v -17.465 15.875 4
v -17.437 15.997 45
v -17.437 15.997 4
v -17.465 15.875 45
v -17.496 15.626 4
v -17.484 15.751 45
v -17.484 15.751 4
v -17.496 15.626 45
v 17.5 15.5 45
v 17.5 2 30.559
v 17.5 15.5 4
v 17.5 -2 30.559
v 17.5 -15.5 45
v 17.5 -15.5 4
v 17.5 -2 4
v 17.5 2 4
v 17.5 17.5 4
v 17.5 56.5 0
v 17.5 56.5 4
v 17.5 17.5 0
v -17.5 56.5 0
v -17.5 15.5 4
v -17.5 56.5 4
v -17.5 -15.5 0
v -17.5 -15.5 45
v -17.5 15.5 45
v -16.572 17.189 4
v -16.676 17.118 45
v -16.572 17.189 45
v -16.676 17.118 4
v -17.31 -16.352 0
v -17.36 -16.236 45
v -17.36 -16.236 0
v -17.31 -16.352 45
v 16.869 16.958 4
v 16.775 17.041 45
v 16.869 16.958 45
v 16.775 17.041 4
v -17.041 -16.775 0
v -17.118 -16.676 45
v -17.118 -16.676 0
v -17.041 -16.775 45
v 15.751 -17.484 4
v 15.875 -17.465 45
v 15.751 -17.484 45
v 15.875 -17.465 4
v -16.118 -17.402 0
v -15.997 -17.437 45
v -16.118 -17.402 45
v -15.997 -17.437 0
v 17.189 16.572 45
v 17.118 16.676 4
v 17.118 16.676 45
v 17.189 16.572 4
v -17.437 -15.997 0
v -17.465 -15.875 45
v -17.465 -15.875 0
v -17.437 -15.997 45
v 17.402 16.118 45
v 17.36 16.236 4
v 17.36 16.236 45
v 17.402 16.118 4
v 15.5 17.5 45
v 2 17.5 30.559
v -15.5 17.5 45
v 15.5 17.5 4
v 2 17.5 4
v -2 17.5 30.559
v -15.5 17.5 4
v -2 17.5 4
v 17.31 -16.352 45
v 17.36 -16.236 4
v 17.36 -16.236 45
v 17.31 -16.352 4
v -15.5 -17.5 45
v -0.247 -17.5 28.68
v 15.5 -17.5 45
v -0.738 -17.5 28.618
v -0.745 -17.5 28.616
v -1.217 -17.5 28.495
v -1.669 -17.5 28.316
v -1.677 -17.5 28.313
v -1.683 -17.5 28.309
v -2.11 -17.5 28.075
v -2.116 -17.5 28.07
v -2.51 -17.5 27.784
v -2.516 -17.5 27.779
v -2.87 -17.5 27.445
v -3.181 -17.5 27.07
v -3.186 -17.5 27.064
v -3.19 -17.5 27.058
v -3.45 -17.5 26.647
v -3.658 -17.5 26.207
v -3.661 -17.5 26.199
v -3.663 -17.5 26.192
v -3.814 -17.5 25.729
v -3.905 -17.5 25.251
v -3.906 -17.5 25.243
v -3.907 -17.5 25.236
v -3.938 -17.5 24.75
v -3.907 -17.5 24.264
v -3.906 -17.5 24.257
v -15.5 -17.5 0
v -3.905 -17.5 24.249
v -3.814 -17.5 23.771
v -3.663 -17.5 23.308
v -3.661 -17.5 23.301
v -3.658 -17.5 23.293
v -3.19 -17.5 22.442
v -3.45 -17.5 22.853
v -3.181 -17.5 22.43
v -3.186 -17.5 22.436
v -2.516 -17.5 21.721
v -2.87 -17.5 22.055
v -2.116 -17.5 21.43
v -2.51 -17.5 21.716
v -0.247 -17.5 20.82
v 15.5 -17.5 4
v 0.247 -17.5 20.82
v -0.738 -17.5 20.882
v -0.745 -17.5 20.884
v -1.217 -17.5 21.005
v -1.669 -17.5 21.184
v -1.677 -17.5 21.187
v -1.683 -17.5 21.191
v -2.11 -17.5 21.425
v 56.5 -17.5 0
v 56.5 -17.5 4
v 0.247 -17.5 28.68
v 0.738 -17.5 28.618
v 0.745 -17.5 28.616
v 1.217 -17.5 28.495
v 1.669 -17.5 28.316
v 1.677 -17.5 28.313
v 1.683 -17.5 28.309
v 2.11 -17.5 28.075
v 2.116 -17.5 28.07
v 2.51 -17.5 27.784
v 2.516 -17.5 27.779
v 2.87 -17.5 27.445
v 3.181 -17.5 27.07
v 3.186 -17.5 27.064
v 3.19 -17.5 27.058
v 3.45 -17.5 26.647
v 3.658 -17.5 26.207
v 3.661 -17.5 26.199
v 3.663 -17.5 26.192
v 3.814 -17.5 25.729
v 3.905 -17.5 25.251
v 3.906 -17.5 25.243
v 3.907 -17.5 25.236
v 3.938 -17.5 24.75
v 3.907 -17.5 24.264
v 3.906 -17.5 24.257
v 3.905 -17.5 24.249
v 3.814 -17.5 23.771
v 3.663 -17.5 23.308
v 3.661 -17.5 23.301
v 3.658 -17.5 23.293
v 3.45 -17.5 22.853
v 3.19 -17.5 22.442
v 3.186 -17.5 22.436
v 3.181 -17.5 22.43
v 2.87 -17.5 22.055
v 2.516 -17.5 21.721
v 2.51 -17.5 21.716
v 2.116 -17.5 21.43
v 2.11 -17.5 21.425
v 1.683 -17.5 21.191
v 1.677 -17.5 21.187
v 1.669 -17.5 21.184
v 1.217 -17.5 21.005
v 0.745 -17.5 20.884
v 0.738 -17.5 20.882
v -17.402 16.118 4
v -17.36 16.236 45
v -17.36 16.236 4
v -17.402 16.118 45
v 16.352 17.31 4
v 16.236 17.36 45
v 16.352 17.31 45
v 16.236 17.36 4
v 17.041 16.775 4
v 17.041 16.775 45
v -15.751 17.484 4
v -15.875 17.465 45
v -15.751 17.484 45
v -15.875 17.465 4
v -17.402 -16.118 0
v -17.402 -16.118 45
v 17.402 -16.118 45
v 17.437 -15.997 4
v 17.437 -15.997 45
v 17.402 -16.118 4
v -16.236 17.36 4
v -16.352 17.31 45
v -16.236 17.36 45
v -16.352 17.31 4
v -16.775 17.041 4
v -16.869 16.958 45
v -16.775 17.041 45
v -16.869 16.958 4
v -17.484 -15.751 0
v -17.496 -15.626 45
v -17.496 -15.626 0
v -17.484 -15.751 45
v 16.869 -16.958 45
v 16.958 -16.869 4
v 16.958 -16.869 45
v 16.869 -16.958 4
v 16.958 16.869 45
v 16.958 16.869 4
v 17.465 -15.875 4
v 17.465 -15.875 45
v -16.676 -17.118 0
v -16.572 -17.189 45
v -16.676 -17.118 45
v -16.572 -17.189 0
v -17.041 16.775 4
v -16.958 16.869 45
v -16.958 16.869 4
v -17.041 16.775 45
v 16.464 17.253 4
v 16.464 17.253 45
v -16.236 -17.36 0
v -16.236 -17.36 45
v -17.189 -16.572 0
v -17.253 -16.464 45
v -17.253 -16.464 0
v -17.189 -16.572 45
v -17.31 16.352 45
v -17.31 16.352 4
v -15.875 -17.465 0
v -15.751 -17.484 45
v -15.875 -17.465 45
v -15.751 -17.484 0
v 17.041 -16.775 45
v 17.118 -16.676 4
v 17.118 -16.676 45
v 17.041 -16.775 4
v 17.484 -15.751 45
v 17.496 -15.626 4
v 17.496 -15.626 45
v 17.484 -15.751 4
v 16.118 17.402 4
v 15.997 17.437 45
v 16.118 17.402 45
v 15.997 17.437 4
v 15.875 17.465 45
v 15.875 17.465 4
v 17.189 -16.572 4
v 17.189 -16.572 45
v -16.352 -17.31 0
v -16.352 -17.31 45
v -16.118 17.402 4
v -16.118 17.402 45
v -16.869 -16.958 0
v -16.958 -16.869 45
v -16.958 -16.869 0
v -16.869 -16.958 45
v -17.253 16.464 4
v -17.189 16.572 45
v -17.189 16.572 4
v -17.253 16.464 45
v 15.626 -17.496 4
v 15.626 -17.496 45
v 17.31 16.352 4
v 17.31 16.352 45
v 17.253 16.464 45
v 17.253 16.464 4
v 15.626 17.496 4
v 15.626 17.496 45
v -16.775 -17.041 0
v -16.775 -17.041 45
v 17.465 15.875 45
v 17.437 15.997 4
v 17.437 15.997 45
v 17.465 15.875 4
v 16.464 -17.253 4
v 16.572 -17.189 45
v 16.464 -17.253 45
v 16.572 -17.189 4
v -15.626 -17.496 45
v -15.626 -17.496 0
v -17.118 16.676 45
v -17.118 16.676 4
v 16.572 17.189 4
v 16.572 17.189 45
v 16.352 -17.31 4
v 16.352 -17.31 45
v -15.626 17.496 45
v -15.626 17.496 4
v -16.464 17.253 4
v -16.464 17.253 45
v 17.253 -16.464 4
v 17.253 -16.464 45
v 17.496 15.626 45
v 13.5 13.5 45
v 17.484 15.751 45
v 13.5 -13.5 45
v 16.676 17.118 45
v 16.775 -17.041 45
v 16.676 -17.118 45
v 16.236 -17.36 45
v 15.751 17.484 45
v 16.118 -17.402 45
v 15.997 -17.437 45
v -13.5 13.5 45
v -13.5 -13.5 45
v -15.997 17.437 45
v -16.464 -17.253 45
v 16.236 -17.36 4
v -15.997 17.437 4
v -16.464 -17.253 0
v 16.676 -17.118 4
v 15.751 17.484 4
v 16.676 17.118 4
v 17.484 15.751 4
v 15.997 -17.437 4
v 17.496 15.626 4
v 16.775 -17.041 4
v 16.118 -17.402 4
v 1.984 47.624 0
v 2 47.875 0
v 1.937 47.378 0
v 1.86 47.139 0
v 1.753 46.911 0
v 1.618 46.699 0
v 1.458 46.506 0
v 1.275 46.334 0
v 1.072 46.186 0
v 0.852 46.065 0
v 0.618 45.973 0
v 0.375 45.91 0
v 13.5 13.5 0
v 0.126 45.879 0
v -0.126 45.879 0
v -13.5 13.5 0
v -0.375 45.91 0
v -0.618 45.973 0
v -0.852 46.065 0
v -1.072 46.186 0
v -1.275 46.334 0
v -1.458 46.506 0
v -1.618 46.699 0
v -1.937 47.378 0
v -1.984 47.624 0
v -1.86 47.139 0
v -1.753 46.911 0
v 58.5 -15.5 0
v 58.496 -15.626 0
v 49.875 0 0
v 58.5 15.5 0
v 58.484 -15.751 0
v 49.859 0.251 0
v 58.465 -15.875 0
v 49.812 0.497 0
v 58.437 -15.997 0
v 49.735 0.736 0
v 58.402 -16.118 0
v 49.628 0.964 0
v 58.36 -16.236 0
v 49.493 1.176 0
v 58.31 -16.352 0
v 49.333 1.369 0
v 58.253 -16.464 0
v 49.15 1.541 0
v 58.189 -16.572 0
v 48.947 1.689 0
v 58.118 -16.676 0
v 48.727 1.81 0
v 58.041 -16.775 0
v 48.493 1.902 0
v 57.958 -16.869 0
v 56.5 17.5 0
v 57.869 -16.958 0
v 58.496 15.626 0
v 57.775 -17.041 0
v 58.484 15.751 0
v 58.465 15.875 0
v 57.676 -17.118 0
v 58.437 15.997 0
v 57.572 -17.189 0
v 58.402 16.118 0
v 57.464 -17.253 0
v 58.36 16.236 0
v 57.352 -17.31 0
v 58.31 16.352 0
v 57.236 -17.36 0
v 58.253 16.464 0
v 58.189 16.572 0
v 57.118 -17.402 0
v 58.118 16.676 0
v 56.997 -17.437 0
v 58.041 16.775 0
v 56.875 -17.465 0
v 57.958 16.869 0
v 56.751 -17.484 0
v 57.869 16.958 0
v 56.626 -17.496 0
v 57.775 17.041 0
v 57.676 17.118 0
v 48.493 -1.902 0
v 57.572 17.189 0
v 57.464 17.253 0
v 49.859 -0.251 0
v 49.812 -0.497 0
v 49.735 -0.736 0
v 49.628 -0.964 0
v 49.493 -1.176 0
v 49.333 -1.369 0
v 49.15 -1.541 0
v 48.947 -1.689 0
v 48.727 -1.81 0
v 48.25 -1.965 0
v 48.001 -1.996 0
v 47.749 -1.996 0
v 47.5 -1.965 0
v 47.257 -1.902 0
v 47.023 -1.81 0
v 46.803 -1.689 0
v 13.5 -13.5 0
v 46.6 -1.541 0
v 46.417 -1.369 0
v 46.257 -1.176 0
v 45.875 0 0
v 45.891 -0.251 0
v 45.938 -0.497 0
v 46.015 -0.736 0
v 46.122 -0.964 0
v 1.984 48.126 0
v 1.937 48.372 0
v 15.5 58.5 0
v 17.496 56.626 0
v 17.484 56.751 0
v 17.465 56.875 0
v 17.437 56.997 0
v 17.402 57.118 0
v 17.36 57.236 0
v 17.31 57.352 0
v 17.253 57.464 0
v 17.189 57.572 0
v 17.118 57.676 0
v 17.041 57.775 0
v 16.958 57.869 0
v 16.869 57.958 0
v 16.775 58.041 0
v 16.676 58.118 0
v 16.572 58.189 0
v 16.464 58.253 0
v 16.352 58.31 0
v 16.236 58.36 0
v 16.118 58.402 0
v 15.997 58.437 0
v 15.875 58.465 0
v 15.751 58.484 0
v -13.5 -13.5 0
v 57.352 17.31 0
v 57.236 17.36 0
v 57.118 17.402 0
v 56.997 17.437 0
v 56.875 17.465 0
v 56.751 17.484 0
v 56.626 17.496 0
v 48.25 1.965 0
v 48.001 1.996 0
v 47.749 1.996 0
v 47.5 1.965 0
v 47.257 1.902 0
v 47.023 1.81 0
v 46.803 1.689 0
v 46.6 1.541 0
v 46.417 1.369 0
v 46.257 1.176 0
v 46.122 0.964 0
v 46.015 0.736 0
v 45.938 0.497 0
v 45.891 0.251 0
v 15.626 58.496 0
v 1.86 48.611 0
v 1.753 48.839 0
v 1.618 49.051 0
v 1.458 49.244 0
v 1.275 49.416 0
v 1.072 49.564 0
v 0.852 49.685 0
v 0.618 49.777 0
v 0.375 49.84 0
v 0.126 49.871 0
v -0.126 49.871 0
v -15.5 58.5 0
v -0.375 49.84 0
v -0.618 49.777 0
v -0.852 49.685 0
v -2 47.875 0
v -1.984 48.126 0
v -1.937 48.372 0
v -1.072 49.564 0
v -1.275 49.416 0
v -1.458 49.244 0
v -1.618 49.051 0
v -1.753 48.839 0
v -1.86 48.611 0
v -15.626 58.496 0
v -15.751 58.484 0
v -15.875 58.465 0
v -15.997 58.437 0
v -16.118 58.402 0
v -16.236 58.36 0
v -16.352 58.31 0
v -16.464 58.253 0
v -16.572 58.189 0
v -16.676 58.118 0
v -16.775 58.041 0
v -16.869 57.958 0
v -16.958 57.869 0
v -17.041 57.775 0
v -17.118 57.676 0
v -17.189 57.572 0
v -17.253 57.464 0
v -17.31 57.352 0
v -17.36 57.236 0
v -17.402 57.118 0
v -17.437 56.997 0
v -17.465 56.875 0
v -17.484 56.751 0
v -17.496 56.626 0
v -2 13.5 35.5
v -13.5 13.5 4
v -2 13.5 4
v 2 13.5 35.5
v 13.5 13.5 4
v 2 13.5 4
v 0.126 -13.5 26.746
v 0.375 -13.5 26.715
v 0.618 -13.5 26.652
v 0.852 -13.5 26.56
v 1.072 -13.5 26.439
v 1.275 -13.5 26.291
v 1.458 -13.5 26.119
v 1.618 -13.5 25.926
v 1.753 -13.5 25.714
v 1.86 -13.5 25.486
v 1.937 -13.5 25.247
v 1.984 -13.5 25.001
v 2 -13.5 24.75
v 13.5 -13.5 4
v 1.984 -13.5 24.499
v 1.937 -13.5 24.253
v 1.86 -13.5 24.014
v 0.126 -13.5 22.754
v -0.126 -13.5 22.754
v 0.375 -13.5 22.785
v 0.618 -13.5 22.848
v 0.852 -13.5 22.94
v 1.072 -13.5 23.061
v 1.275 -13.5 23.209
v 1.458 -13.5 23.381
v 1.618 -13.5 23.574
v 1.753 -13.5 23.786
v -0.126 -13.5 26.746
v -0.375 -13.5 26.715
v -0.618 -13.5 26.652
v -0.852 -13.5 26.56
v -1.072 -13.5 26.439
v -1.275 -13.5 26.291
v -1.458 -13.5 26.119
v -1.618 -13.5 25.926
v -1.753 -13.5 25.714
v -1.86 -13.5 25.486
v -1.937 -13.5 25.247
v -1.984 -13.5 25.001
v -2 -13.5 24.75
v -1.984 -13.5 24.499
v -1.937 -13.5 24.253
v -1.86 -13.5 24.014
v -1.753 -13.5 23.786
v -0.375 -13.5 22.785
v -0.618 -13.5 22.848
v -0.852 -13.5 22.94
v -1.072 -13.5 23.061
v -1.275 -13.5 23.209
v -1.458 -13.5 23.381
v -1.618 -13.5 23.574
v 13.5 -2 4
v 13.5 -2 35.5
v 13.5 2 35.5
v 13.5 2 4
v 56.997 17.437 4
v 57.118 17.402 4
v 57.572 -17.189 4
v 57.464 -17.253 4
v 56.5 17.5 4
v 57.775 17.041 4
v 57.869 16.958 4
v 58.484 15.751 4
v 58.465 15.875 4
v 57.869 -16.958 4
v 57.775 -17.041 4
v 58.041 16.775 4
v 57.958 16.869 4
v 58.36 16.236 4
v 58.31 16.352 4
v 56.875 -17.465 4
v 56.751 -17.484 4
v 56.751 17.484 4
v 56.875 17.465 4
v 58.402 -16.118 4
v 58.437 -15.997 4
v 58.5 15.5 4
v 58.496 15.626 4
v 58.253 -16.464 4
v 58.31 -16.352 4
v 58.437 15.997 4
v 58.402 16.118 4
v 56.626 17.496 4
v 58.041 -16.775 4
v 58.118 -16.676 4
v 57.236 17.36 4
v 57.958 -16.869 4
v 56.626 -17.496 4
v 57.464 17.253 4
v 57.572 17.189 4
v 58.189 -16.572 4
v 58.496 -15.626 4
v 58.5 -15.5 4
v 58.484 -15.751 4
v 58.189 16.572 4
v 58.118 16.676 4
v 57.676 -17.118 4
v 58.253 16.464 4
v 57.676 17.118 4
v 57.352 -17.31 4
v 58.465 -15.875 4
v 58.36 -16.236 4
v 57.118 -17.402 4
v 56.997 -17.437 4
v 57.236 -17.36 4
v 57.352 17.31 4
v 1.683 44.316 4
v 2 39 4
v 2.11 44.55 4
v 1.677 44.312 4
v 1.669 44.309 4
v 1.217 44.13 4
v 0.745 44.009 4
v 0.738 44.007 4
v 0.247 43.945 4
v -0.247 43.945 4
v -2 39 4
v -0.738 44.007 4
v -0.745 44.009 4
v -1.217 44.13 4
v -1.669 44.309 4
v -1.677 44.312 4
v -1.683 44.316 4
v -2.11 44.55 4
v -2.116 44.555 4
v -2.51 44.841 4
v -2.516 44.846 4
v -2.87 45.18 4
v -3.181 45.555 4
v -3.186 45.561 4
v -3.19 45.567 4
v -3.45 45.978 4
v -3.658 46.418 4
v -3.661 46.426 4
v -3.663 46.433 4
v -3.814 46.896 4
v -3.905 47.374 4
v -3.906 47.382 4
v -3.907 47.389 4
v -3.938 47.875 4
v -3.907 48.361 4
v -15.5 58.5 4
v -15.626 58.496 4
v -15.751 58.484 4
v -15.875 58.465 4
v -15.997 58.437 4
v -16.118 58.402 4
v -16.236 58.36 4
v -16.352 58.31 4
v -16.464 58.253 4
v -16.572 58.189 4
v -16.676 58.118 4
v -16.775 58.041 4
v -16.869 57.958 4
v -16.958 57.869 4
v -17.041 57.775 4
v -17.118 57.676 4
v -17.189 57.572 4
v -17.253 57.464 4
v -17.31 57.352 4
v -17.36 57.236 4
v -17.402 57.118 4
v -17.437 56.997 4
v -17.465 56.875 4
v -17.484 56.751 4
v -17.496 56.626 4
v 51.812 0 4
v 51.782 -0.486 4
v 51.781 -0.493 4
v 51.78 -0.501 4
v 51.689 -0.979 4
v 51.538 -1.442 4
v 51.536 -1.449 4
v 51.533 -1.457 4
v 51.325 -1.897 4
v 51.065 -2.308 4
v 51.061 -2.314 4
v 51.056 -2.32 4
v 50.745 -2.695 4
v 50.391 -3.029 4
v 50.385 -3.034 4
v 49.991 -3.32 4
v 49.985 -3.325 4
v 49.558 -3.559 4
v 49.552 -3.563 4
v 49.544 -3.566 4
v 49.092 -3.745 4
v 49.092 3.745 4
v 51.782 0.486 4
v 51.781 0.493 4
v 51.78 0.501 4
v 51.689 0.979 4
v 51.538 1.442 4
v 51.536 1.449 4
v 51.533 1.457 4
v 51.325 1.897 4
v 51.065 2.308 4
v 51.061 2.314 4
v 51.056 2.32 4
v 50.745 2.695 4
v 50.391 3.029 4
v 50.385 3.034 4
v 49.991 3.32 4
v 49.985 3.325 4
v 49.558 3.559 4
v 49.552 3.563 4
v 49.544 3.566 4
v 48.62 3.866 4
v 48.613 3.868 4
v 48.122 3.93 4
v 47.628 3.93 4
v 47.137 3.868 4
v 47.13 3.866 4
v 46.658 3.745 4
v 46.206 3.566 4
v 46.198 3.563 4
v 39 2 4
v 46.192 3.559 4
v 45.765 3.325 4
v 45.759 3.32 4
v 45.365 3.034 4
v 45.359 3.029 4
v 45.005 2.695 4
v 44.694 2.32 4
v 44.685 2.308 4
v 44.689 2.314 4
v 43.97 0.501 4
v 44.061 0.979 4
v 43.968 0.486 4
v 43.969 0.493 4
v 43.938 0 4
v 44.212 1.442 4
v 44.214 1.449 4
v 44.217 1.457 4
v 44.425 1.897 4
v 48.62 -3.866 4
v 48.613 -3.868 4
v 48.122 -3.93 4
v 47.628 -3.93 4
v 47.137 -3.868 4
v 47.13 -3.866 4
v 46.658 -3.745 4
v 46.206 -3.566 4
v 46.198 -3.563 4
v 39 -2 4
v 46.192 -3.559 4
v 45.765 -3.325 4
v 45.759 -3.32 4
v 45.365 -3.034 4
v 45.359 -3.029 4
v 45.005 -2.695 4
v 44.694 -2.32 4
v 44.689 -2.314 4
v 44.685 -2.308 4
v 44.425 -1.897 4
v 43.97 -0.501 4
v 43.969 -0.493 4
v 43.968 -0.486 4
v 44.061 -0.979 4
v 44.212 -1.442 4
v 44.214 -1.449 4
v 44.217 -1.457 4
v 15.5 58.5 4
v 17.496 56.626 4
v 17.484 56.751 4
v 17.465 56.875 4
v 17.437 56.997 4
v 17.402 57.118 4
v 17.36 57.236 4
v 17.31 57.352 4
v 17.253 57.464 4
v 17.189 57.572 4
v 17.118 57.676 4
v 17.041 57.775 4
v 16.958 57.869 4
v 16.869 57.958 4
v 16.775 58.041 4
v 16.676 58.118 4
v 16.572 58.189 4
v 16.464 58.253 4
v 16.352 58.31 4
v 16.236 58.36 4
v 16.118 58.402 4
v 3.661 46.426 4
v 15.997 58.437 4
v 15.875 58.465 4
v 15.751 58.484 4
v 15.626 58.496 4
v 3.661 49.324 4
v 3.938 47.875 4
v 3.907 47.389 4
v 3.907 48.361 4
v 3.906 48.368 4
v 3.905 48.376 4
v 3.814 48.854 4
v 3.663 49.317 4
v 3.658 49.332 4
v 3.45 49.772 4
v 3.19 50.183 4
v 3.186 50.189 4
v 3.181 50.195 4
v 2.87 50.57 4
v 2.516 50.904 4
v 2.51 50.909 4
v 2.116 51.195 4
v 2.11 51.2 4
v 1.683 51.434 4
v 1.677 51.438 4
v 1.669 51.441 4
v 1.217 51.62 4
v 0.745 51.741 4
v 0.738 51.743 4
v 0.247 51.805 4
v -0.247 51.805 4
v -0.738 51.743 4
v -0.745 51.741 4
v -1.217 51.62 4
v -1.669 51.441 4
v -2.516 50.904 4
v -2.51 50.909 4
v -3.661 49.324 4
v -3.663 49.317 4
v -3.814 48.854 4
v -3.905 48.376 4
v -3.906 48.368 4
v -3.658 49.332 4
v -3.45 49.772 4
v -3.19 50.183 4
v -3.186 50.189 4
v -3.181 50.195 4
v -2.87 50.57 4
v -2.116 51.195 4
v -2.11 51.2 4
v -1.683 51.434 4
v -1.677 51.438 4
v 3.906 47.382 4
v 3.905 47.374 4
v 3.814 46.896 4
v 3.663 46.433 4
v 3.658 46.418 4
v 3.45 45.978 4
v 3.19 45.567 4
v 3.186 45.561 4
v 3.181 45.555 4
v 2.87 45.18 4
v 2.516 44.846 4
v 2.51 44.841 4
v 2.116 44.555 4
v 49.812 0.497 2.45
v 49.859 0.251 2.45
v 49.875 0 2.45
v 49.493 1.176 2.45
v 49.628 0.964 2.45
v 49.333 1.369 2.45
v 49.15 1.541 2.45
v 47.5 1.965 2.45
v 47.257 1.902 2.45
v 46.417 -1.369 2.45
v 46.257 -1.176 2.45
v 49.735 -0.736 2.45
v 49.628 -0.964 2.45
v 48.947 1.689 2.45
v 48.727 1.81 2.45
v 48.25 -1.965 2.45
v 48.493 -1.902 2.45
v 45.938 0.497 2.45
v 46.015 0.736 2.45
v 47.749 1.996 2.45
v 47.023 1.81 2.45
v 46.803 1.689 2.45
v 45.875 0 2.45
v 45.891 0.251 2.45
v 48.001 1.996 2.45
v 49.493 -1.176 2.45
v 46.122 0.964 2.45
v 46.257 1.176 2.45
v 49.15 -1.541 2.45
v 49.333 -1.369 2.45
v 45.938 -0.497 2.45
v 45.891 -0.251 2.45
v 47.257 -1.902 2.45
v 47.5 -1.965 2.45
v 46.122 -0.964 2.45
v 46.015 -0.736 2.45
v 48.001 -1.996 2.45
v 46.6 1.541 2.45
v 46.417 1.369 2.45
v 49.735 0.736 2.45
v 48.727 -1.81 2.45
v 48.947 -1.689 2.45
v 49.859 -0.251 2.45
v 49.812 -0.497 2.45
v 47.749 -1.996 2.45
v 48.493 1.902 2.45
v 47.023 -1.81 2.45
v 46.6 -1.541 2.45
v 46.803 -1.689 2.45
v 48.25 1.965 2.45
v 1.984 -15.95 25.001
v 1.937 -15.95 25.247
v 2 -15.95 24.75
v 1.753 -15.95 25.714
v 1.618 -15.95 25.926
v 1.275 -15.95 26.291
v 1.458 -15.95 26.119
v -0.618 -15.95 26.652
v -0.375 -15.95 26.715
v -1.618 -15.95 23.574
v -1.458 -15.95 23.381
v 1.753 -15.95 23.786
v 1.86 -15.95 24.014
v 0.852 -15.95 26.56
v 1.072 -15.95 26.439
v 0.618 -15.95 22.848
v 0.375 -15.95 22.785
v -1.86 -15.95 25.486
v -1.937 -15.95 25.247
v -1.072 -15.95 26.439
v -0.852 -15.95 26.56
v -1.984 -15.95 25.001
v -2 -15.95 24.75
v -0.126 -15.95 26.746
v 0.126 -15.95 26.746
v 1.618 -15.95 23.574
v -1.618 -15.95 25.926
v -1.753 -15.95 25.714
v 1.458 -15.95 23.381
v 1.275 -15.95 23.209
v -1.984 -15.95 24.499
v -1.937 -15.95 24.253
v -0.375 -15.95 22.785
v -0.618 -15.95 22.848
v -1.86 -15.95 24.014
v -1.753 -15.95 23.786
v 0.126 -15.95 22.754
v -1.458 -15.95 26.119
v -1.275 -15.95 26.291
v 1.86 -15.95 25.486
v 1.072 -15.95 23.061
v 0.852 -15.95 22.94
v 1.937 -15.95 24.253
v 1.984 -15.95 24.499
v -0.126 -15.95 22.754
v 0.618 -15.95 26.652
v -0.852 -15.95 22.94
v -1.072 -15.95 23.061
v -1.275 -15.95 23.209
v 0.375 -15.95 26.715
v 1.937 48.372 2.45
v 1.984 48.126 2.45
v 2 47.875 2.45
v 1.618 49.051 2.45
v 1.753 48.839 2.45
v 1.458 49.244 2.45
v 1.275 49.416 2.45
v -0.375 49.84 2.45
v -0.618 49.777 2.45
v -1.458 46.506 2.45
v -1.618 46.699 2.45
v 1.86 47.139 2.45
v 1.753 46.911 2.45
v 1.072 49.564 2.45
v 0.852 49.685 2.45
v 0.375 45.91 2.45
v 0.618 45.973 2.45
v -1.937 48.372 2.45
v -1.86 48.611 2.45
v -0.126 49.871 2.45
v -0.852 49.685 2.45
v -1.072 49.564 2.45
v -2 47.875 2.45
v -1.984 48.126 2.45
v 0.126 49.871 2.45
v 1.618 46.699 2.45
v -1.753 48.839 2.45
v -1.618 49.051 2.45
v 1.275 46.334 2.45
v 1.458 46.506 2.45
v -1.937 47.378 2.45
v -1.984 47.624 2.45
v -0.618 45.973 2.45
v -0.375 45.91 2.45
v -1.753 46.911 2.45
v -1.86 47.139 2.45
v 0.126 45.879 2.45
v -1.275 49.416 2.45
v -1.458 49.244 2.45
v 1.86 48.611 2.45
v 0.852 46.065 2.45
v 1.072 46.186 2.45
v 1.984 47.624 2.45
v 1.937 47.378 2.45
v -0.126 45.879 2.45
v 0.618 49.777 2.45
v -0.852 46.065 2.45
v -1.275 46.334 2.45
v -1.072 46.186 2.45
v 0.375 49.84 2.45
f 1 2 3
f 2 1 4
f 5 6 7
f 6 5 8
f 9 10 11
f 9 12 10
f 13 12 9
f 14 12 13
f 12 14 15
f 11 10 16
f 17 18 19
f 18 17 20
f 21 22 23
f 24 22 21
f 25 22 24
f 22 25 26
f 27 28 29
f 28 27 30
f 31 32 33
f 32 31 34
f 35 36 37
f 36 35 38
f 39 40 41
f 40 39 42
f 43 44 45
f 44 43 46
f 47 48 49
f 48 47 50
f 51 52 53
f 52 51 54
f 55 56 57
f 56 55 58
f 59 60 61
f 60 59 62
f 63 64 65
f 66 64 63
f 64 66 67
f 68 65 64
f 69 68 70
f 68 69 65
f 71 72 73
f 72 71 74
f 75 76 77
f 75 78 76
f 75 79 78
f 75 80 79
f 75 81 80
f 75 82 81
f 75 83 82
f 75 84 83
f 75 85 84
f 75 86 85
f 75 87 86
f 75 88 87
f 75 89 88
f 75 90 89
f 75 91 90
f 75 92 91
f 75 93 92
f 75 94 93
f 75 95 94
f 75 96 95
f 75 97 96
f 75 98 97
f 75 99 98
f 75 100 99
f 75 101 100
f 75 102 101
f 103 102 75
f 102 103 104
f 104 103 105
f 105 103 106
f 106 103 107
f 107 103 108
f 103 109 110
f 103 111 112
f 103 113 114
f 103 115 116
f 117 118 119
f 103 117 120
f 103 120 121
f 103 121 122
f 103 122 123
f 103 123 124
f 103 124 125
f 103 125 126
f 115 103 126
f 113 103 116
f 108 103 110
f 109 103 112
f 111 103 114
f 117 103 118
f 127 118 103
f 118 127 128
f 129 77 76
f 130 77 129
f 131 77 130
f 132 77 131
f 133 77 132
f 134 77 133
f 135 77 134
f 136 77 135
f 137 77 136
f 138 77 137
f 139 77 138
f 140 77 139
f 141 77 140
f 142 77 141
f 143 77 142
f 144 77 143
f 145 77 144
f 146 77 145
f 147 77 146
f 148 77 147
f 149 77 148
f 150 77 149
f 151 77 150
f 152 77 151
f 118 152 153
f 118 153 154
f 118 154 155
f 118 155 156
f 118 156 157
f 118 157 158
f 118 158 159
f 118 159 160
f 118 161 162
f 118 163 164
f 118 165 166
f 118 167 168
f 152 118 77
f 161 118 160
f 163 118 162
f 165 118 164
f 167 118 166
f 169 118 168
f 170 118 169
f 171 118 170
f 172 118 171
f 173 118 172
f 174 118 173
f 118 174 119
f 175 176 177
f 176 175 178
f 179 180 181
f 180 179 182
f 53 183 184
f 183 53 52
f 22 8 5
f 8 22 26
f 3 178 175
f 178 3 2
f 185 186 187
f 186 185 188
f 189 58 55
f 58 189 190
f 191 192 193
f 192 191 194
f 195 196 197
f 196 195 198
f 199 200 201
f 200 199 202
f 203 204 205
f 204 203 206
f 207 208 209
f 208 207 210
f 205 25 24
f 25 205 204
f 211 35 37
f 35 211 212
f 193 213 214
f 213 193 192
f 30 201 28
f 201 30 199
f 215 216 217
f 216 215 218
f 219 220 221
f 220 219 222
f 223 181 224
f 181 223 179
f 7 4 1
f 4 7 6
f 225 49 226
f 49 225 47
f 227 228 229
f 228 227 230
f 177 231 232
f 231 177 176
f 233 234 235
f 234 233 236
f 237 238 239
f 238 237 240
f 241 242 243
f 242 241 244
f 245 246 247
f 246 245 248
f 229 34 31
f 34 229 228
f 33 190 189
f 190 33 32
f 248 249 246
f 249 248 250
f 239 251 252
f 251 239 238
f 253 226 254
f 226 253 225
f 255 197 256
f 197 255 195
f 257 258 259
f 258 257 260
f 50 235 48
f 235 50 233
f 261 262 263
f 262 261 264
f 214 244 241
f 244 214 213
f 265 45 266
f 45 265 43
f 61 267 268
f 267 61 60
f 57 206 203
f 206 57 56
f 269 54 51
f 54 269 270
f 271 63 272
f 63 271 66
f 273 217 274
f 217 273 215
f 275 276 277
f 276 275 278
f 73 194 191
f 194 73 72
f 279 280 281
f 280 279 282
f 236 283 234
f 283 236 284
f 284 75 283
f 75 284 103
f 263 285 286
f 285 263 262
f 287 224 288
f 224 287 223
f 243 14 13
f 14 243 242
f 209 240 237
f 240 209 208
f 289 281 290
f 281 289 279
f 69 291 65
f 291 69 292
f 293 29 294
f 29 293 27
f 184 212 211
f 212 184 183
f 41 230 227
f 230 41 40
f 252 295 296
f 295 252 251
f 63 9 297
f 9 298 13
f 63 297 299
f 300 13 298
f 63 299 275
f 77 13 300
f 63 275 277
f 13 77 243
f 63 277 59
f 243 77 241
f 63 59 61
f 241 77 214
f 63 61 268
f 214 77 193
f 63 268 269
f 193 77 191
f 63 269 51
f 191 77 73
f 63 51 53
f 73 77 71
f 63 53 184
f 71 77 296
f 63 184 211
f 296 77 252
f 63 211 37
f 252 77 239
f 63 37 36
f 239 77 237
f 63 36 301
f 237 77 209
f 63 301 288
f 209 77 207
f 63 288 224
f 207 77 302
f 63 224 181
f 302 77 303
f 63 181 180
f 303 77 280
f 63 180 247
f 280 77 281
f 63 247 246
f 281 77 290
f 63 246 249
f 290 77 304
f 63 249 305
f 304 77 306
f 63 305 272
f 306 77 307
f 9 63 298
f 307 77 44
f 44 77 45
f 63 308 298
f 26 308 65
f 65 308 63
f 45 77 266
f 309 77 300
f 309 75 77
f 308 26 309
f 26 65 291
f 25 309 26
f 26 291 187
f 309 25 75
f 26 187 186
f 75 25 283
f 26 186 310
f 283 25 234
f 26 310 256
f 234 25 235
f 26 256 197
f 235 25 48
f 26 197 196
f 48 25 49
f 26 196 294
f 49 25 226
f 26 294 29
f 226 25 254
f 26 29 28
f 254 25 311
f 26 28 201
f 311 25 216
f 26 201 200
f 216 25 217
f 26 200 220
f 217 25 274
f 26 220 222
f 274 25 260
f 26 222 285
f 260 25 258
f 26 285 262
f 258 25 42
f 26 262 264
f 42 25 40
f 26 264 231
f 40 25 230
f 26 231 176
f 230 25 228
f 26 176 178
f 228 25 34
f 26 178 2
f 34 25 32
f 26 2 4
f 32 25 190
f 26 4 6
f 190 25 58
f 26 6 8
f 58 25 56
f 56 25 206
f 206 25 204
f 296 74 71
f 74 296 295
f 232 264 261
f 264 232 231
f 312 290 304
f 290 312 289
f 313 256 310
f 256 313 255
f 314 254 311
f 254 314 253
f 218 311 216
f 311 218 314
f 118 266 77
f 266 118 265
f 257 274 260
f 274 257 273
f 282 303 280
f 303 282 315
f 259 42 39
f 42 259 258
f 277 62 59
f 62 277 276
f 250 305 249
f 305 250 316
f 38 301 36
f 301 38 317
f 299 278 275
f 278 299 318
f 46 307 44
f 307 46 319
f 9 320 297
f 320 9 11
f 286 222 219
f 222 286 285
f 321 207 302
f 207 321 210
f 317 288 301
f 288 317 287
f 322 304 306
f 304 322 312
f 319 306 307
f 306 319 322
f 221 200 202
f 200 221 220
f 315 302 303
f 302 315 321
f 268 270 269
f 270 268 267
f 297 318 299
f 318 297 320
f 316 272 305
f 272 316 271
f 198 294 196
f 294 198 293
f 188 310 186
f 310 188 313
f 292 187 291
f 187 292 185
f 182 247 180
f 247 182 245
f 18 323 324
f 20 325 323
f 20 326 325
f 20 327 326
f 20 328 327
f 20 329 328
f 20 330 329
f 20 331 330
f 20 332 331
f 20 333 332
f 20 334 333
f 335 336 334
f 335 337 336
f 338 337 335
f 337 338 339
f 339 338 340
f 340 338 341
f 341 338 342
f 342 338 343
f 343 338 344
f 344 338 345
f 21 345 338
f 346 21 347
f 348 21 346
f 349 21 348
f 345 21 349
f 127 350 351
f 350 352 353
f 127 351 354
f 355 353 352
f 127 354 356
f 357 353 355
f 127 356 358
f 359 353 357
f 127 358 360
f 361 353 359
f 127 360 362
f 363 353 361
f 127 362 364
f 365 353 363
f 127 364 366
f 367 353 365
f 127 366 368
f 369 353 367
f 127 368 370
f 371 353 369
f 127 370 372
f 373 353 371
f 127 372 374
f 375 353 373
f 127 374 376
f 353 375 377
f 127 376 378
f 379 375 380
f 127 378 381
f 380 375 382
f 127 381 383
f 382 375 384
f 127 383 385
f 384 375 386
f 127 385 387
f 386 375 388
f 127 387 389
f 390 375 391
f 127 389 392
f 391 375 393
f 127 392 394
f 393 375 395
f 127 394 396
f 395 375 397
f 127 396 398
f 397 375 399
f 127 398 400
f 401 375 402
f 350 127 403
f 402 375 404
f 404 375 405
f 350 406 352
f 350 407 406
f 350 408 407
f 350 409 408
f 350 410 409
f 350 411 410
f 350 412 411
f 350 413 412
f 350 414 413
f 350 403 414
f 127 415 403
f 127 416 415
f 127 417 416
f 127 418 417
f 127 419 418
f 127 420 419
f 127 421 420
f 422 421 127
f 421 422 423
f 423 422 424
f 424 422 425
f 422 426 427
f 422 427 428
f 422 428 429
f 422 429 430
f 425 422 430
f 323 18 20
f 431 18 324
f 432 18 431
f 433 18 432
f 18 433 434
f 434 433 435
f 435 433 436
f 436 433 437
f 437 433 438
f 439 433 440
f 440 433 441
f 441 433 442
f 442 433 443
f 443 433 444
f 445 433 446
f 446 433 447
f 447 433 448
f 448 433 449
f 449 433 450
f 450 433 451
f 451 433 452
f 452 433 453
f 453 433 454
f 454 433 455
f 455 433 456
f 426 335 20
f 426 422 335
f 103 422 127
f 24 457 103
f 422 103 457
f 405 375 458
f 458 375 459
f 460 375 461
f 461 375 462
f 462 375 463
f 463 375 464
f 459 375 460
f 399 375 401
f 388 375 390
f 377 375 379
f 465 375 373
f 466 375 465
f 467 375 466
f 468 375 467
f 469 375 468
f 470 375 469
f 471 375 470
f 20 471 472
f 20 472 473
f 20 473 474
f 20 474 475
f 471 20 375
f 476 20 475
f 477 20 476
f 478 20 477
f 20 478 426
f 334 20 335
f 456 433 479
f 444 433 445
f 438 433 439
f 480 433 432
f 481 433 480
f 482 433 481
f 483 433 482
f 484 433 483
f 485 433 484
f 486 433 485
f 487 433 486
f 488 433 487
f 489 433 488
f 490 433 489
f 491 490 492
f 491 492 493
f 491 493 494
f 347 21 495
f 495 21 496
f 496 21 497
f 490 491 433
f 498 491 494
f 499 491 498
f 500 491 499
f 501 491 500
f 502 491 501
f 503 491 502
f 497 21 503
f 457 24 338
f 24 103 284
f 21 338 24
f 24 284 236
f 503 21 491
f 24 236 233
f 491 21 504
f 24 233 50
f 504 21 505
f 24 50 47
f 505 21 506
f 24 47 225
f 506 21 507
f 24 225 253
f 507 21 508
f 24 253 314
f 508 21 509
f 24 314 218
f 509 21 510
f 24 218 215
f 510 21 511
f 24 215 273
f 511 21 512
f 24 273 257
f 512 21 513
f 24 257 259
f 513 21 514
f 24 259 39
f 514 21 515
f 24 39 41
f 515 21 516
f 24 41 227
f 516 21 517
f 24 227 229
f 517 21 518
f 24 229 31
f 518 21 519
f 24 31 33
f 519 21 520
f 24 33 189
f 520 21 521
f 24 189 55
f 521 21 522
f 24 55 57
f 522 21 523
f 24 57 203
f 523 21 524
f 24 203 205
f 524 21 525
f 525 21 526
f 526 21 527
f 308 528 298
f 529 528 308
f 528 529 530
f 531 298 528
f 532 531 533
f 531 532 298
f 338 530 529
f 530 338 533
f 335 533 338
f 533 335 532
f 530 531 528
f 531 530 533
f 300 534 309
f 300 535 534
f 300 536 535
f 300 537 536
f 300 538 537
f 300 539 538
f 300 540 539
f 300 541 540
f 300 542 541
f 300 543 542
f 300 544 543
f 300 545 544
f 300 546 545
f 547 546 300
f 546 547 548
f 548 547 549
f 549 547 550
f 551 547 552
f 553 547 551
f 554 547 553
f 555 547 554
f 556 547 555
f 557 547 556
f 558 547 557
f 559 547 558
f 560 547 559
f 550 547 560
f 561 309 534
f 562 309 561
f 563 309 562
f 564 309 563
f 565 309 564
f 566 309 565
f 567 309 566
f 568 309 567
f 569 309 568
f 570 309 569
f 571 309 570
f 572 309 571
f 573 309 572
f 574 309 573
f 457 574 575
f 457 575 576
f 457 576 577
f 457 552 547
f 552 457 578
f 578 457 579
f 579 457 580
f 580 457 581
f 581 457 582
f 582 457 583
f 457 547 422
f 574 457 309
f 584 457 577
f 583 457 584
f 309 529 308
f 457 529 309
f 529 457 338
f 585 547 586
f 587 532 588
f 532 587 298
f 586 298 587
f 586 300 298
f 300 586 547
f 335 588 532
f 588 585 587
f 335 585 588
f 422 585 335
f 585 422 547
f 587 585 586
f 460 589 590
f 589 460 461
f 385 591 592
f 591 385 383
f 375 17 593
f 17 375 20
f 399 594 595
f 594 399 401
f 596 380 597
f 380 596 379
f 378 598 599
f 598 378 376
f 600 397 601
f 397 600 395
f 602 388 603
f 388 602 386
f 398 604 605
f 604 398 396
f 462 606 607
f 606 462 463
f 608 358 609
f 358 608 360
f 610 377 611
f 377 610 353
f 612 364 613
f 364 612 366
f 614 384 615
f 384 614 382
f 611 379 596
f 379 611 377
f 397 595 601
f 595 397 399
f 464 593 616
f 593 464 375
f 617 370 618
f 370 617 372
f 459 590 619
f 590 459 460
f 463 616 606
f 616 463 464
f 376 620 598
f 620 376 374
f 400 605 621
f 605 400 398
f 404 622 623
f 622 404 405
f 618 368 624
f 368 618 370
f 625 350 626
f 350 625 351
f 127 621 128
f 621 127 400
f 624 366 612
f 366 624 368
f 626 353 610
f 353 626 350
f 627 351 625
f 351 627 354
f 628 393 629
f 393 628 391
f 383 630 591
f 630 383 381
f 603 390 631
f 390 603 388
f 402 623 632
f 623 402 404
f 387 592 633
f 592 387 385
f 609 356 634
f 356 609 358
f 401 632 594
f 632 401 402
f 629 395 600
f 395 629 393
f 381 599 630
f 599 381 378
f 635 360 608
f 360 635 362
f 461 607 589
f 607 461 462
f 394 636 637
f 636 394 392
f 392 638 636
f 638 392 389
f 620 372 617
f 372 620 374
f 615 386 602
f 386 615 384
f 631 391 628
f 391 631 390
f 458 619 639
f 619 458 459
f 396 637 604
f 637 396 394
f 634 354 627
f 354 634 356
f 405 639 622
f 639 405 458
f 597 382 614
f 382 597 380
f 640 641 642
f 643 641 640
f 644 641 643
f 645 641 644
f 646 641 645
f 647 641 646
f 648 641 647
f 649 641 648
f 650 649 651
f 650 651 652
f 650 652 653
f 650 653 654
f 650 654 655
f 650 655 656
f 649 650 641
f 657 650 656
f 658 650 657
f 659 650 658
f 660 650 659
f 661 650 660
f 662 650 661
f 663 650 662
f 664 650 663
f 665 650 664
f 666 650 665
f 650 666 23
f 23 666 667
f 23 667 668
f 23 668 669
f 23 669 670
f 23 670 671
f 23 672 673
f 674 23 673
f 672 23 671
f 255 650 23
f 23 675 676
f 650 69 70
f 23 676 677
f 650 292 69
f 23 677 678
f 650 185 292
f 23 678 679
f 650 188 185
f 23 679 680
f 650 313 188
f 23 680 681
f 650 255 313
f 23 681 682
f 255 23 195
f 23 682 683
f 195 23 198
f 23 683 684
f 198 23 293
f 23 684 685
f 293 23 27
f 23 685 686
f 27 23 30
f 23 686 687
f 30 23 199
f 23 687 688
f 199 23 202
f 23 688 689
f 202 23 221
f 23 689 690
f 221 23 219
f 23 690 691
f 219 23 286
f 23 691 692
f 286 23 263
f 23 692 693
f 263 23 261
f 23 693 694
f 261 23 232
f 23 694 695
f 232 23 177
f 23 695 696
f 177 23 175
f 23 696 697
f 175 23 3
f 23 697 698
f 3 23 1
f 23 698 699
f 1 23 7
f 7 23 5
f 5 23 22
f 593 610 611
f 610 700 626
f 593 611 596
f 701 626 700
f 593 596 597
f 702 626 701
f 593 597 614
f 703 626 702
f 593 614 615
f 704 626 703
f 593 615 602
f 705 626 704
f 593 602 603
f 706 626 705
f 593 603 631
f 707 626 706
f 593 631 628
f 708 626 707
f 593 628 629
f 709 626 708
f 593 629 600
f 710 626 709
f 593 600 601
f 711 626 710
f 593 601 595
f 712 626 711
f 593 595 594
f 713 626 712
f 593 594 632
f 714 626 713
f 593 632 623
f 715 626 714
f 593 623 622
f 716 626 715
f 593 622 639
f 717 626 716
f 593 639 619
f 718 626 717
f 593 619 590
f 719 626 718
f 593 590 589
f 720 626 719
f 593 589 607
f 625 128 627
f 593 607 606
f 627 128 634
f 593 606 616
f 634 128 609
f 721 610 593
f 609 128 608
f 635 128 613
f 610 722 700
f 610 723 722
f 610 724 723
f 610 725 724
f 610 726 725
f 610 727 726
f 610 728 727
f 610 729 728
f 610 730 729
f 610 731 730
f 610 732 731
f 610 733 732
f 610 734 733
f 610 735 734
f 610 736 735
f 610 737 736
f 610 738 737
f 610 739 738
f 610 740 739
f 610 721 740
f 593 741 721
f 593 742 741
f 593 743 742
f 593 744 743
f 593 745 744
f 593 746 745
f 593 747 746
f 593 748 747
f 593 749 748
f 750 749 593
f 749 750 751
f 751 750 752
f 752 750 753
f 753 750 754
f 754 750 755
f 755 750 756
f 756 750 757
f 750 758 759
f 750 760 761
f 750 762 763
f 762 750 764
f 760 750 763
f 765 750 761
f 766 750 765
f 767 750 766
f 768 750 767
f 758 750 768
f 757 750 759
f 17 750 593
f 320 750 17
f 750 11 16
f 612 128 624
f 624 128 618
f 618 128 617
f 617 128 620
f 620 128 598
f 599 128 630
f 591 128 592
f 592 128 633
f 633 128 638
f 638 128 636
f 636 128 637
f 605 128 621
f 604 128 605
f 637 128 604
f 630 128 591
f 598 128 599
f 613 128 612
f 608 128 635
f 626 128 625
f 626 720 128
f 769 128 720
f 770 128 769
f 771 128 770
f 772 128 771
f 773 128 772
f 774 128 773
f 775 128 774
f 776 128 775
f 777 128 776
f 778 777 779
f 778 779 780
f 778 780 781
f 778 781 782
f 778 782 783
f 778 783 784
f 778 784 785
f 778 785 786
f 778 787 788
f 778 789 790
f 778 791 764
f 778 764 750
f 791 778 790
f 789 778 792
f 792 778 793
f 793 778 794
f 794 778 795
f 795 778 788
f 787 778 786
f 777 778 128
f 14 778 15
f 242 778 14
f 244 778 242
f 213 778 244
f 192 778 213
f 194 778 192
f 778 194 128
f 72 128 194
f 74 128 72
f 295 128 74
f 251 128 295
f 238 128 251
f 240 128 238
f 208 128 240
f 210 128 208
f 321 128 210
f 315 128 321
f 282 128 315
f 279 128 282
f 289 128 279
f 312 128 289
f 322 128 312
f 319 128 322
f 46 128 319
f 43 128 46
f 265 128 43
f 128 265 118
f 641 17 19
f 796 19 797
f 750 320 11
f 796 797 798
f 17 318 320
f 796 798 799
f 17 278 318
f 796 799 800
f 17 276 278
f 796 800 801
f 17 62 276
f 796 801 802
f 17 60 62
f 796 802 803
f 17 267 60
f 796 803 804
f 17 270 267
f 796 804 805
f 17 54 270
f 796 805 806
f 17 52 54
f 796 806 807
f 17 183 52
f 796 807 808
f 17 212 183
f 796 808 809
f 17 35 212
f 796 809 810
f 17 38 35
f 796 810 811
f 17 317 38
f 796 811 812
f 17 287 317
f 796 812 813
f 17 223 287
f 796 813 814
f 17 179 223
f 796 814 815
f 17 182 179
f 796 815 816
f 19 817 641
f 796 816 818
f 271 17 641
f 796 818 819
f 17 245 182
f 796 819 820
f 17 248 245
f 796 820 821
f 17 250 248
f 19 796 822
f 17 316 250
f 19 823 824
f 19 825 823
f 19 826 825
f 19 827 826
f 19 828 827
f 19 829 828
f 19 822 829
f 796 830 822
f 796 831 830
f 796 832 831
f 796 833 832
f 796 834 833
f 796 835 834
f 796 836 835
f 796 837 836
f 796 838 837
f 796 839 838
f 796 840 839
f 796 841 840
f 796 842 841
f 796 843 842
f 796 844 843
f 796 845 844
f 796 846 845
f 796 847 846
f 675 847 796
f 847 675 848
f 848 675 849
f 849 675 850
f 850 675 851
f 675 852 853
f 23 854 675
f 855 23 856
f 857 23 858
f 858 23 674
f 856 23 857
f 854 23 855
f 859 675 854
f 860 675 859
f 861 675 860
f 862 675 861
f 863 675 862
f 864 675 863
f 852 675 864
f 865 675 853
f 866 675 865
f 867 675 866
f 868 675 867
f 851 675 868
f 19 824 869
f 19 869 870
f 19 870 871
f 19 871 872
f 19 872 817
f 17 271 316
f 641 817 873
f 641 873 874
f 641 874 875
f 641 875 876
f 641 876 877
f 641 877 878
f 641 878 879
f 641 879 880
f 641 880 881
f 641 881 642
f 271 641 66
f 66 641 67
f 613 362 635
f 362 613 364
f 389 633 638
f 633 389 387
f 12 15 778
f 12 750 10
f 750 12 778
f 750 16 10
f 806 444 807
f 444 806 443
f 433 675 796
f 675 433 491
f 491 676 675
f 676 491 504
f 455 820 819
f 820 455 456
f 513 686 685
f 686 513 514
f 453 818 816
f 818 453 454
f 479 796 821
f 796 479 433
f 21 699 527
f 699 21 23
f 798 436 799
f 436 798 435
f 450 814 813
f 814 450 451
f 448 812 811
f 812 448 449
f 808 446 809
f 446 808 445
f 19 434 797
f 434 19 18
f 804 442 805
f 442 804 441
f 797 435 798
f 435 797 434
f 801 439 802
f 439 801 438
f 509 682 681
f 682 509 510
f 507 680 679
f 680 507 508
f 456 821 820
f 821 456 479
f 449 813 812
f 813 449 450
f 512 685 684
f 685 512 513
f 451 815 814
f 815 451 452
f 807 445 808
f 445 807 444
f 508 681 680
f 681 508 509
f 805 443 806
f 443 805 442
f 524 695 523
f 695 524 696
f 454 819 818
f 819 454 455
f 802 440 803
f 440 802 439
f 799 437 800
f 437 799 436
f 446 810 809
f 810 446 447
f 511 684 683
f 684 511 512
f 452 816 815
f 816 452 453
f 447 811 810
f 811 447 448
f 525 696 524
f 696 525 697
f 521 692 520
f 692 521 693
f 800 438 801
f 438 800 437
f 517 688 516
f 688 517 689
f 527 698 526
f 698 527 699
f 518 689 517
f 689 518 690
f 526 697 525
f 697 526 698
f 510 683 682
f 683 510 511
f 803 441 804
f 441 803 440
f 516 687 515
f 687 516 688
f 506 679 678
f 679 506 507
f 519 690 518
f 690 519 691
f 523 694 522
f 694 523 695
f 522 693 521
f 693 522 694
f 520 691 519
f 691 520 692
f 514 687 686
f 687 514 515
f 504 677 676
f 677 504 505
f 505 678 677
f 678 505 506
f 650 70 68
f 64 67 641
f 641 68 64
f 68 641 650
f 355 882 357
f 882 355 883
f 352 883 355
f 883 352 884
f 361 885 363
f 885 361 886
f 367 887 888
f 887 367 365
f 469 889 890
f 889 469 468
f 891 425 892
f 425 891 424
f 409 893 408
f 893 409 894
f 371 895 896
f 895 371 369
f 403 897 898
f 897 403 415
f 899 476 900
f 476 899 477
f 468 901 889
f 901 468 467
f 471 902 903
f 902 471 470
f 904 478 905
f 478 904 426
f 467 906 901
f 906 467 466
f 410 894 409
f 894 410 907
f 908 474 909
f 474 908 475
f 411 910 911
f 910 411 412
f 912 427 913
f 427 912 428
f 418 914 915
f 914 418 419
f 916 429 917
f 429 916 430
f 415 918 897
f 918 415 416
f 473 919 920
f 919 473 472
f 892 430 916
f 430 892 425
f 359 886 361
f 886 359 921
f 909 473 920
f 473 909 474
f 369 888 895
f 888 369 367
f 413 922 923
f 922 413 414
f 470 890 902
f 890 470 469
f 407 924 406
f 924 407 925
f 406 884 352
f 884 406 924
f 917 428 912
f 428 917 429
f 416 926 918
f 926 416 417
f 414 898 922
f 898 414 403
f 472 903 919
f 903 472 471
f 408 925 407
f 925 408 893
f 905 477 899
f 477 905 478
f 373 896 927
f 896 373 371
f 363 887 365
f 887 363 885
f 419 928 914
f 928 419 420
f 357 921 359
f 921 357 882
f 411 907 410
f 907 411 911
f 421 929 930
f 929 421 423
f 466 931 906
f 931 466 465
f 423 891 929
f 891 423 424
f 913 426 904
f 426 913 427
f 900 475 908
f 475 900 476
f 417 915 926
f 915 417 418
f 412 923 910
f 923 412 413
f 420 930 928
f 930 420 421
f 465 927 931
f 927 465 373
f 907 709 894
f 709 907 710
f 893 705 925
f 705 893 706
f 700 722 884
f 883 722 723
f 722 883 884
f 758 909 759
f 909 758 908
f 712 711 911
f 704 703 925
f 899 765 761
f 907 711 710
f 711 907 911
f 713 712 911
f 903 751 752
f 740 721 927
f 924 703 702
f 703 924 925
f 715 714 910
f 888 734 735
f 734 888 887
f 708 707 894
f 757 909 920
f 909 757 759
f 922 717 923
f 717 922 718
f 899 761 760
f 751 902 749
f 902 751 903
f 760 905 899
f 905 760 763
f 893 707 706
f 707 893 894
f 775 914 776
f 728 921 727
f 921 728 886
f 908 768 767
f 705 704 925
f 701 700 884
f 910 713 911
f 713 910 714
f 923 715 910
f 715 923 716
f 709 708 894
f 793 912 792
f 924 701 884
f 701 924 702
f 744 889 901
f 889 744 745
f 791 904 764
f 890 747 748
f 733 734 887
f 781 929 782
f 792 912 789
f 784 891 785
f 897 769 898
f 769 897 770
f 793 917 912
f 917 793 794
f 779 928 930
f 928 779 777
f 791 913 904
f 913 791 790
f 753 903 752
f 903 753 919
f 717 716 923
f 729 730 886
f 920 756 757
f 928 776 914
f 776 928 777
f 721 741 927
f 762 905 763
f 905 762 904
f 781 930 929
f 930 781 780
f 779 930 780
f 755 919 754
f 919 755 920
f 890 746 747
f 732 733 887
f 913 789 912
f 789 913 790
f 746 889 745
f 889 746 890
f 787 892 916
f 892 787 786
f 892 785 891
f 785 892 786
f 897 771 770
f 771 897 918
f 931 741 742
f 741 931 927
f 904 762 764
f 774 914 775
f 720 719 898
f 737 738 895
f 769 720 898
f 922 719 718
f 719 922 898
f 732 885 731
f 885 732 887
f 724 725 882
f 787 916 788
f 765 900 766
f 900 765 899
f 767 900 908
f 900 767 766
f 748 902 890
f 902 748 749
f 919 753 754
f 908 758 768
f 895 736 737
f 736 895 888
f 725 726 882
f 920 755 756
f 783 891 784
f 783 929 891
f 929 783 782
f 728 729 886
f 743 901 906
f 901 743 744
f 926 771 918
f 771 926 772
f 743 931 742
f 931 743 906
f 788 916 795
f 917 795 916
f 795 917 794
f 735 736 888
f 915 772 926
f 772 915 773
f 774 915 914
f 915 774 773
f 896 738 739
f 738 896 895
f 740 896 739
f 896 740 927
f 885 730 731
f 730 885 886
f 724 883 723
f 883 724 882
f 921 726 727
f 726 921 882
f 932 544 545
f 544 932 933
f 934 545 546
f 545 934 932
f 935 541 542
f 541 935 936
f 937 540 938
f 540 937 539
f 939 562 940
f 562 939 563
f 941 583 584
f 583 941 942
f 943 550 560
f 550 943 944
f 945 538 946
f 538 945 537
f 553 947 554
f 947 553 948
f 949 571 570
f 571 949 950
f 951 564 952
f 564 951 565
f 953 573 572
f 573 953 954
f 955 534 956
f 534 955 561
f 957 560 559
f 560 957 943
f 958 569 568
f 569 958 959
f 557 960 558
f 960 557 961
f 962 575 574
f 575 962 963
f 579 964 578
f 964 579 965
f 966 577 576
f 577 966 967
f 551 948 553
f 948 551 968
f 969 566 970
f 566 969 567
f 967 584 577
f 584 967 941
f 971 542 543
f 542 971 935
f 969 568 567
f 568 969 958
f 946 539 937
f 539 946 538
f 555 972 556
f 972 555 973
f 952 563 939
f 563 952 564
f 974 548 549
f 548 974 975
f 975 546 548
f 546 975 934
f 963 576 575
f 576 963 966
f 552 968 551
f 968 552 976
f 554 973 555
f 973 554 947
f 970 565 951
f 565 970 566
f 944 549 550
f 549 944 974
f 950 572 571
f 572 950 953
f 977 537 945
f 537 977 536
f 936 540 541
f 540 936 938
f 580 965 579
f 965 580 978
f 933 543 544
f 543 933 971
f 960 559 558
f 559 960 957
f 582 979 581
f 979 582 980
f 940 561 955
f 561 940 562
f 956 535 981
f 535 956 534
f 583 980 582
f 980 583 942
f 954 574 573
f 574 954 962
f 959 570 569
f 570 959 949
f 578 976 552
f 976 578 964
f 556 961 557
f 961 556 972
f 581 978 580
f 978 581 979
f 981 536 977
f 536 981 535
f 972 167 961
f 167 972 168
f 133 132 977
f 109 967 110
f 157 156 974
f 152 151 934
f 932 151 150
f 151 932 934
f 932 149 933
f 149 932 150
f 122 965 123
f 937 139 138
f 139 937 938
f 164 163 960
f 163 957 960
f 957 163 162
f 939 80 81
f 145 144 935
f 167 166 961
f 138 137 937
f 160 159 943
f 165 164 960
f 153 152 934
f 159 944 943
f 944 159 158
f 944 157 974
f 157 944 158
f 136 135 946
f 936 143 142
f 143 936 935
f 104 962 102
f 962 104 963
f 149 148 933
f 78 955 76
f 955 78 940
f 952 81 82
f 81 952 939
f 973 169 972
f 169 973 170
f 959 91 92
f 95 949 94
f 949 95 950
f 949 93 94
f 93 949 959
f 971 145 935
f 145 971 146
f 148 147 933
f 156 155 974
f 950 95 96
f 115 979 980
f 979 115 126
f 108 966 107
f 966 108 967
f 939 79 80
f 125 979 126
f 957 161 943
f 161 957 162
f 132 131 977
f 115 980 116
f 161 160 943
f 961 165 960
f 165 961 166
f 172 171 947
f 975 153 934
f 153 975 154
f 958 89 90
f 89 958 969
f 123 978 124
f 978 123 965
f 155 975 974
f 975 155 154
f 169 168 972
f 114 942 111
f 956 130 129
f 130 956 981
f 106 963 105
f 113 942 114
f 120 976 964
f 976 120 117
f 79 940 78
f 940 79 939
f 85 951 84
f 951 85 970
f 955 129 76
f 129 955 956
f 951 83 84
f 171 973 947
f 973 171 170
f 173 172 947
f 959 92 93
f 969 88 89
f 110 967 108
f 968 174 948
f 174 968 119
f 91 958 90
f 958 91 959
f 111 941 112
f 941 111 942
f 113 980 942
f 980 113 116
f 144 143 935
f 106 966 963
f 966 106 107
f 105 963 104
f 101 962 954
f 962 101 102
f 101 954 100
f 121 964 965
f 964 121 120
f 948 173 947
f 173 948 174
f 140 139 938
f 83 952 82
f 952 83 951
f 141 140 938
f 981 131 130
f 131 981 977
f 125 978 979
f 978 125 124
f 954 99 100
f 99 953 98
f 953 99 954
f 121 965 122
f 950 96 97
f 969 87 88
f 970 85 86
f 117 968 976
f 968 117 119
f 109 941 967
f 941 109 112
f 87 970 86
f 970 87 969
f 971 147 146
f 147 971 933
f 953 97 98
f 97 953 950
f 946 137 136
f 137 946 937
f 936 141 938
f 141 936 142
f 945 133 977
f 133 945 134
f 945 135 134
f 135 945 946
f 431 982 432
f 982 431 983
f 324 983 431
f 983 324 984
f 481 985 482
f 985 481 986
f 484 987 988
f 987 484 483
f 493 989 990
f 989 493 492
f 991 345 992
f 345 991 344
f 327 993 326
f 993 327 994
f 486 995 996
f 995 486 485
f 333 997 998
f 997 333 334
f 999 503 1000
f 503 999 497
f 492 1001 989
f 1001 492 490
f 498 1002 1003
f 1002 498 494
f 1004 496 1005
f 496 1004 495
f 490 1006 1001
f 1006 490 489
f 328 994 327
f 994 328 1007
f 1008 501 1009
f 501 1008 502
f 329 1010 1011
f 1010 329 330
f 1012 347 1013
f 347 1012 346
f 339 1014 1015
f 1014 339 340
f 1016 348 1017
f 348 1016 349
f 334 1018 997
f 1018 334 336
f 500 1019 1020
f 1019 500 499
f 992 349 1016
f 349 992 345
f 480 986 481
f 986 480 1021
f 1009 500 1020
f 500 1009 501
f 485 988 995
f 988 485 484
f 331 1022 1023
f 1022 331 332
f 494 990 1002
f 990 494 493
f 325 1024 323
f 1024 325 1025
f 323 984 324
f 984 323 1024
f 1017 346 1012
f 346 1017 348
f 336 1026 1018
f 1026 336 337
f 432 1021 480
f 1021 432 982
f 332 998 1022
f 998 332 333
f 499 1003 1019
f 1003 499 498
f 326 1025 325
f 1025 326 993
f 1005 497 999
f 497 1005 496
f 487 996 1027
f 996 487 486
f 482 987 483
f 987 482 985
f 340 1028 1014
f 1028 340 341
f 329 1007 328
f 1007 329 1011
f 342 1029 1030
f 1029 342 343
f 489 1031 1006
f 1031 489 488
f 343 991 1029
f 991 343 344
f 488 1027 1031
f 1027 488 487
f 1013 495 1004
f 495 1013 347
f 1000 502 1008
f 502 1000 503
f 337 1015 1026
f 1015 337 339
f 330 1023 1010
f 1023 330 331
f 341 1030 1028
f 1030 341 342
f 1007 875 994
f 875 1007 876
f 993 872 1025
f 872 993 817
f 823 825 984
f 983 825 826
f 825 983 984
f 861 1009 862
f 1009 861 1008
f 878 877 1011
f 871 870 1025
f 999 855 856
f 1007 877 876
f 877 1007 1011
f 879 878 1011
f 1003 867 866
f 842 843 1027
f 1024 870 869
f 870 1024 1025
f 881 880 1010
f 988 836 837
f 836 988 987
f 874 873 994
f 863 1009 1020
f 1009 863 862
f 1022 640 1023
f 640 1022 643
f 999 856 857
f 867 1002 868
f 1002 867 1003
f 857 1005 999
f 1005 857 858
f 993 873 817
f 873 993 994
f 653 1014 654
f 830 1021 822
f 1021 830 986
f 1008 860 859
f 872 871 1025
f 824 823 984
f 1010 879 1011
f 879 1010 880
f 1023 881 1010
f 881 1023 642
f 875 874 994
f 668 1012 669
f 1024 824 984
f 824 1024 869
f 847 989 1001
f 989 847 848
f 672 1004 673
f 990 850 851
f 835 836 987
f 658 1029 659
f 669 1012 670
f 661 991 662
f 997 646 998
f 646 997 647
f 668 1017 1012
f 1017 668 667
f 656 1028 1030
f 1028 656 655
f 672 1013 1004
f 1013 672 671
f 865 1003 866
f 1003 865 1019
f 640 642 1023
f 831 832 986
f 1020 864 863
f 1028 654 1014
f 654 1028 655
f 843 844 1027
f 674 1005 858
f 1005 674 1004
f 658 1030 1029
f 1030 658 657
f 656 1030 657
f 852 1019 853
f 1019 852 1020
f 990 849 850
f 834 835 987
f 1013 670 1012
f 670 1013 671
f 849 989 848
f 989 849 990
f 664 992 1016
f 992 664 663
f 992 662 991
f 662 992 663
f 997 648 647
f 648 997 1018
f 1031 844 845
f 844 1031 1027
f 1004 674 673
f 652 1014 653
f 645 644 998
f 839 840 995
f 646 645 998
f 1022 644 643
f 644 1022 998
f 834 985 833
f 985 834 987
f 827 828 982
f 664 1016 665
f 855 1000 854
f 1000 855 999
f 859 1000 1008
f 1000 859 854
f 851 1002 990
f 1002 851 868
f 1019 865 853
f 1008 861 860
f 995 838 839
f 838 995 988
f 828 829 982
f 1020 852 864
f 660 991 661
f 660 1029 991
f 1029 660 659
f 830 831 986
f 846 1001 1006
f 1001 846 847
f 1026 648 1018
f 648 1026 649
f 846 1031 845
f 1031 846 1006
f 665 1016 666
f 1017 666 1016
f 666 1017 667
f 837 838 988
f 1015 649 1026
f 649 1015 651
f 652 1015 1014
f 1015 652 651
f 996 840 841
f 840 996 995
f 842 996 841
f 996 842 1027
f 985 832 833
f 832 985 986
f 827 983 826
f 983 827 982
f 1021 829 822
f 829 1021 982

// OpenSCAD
use <MCAD/triangles.scad>

lengthX = 45;
woodX = 27;
wallThick = 4;
screwHead = 8;
screwD = 4;

lengthY = lengthX+woodX;


difference() {
    union() {
        // attache() on Z axis    
        translate([0,0,0.5*(lengthX)])
            rotate([0,0,90]) attache(woodX,woodX,lengthX,wallThick);
        
        // T on X-Z direction
        translate([0.5*(woodX+lengthX),0,0.5*wallThick]) 
            roundedBox(lengthX,woodX+2*wallThick,wallThick,wallThick/2);
        //  triangle reinforcement X-Z plane
        translate([woodX/2,-wallThick/2,wallThick]) 
                rotate([0,-90,-90]) 
                triangle( 0.7*lengthX-wallThick*1.5, 0.7*lengthX, wallThick);
        
        // T on Y-Z direction
        translate([0,0.5*(woodX+lengthX),0.5*wallThick]) 
            roundedBox(woodX+2*wallThick,lengthX,wallThick,wallThick/2);
        //  triangle reinforcement X-Z plane
        translate([-wallThick/2,woodX/2,wallThick]) 
                rotate([90,0,90]) 
                triangle( 0.7*lengthX, 0.7*lengthX-wallThick*1.5, wallThick);
        
        
    }
    // Add holes for screws (1 hole per bar)
    /* X-Y plan below */
    translate([0.5*woodX+0.675*lengthX+wallThick, 0, -0.05]) {
        #cylinder(h=wallThick+0.1, d=screwD, $fn=50);
        translate([0, 0, wallThick-1.5])
        #cylinder(h=1.5+0.1, d1=screwD, d2=screwHead, $fn=50);
    }
    
    /* Z-X plane on the back  */  
    translate([0, -(0.5*woodX-0.05), 0.55*lengthX]) 
        rotate([90,0,0]) {
        #cylinder(h=wallThick+0.1, d=screwD, $fn=50);
        translate([0, 0, wallThick-1.5])
        #cylinder(h=1.5+0.1, d1=screwD, d2=screwHead, $fn=50);
    }
     
    /* Vertical Y-Z direction */
    translate([0, 0.5*woodX+0.675*lengthX+wallThick, -0.05]) {
        #cylinder(h=wallThick+0.1, d=screwD, $fn=50);
        translate([0, 0, wallThick-1.5])
        #cylinder(h=1.5+0.1, d1=screwD, d2=screwHead, $fn=50);
    }
}

module attache(sizeX,sizeY,sizeZ,thick)
difference() {
    roundedBox(sizeX+2*thick,sizeY+2*thick,sizeZ, thick/2);
    #translate([0,0,0]) cube([sizeX,sizeY,sizeZ+3*thick], true);
}

module roundedBox(x,y,z,rad){
	hull() {
        translate([-x/2+rad, y/2-rad,-z/2]) cylinder(h=z,r=rad, $fn=100);
        translate([ x/2-rad, y/2-rad,-z/2]) cylinder(h=z,r=rad, $fn=100);
        translate([-x/2+rad,-y/2+rad,-z/2]) cylinder(h=z,r=rad, $fn=100);
        translate([ x/2-rad,-y/2+rad,-z/2]) cylinder(h=z,r=rad, $fn=100);
   }
}

module backFace(x,y,z,rad){
    difference() {
        union() {
            translate([0,0,z/4]) roundedBox(x,y,z/2,rad);
            hull() {
                translate([-x/2+rad, y/2-rad,z/2]) sphere(r=rad, $fn=100);
                translate([ x/2-rad, y/2-rad,z/2]) sphere(r=rad, $fn=100);
                translate([-x/2+rad,-y/2+rad,z/2]) sphere(r=rad, $fn=100);
                translate([ x/2-rad,-y/2+rad,z/2]) sphere(r=rad, $fn=100);
           }
        }
        translate([0,0,-z/2]) cube([x,y,z], true);
    }
}
